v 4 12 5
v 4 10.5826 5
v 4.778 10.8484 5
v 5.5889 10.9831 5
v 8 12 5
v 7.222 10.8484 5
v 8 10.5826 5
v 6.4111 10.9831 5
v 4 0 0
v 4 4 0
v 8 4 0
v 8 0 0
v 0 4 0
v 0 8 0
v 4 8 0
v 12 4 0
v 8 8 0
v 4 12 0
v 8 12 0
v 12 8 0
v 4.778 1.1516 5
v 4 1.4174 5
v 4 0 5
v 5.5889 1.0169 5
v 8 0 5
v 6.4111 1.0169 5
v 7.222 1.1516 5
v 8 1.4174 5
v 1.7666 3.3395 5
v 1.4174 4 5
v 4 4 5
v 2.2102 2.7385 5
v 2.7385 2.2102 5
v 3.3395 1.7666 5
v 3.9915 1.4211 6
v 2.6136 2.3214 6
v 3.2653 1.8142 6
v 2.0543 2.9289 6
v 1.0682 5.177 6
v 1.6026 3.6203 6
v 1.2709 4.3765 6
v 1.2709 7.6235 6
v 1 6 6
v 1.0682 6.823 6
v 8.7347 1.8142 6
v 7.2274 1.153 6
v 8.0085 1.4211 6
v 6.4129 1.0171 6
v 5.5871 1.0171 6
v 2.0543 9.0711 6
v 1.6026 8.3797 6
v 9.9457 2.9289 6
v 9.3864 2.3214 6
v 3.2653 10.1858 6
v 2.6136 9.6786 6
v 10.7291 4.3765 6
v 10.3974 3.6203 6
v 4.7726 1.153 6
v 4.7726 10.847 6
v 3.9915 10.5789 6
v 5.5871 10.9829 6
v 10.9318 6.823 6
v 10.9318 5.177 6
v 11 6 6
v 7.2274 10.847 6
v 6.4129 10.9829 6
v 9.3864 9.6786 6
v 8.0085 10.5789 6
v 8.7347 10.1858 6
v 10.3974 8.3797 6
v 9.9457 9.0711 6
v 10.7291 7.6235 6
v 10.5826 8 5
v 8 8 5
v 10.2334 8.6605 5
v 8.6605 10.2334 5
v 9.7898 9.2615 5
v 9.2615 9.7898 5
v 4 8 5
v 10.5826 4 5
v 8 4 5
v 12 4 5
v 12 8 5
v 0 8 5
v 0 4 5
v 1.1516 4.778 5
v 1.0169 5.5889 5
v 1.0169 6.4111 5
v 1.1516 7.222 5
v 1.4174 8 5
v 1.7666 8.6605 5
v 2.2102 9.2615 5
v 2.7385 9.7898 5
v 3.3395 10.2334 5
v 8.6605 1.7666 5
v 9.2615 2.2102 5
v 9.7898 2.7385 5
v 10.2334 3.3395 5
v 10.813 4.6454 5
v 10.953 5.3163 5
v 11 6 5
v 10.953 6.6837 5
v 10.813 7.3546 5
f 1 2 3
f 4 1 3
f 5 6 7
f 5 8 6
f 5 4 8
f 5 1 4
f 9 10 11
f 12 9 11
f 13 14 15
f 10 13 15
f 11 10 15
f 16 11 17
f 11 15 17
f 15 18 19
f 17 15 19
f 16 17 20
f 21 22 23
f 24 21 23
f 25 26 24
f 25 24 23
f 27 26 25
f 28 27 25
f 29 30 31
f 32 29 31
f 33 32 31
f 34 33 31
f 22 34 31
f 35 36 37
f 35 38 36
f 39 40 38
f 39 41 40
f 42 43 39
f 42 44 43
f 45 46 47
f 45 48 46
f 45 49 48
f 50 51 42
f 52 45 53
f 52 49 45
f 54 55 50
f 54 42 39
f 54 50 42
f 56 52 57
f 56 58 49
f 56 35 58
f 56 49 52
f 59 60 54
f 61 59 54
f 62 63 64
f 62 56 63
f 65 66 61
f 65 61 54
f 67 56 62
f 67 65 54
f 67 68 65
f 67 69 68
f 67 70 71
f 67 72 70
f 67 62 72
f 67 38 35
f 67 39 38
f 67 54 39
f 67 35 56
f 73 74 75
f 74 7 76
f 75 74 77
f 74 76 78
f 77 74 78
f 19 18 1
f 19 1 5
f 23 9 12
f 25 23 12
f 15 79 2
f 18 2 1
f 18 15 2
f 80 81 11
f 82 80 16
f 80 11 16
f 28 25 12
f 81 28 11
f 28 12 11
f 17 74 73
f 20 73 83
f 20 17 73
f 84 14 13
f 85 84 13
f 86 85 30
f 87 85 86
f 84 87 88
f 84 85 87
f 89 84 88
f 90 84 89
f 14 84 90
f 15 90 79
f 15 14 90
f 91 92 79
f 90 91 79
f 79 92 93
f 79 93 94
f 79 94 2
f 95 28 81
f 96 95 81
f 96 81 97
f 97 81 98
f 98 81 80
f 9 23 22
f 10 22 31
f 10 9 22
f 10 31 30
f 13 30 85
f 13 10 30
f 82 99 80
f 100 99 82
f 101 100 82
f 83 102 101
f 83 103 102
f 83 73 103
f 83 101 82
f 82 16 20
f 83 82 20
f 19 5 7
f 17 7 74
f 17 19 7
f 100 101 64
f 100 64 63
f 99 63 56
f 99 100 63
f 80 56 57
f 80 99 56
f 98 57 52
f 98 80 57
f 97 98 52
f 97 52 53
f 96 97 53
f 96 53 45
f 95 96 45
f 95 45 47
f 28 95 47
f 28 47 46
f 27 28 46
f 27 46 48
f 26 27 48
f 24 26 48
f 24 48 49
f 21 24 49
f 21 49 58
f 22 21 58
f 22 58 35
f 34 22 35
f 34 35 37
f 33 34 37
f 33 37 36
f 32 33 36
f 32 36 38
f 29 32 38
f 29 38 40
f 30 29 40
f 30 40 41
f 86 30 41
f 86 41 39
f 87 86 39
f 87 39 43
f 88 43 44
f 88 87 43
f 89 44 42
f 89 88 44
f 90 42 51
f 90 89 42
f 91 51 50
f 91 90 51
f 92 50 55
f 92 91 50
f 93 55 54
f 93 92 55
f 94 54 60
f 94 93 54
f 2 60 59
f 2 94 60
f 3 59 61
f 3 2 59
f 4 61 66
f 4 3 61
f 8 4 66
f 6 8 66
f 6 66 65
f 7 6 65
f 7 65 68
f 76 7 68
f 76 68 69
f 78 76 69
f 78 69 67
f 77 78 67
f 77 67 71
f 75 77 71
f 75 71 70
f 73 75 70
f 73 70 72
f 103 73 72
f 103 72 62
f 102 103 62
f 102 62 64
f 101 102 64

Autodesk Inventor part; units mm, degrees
ref_plane "YZ Plane" through (0, 0, 0) normal (1, 0, 0) x (0, 1, 0)
ref_plane "XZ Plane" through (0, 0, 0) normal (0, 1, 0) x (-1, 0, 0)
ref_plane "XY Plane" through (0, 0, 0) normal (0, 0, 1) x (1, 0, 0)
sketch "Sketch1" plane through (0, 0, 0) normal (0, 0, 1) x (1, 0, 0)
  line L0 (6, 12) -> (4, 12)
  line L1 (6, 12) -> (8, 12)
  line L2 (12, 6) -> (12, 8)
  line L3 (12, 6) -> (12, 4)
  line L4 (0, 6) -> (0, 8)
  line L5 (0, 6) -> (0, 4)
  line L6 (6, 0) -> (8, 0)
  line L7 (6, 0) -> (4, 0)
  line L8 (4, 0) -> (4, 4)
  line L9 (4, 4) -> (0, 4)
  line L10 (0, 8) -> (4, 8)
  line L11 (4, 8) -> (4, 12)
  line L12 (8, 12) -> (8, 8)
  line L13 (8, 8) -> (12, 8)
  line L14 (8, 0) -> (8, 4)
  line L15 (8, 4) -> (12, 4)
  point P0 (0, 0)
  dimension "d2" = 2
  dimension "d3" = 2
  dimension "d4" = 2
  dimension "d5" = 2
  dimension "d6" = 2
  dimension "d7" = 2
  dimension "d8" = 2
  dimension "d9" = 2
extrude "Extrusion1" add sketch "Sketch1" along normal blind 5
sketch "Sketch2" plane through (0, 0, 5) normal (0, 0, 1) x (1, 0, 0)
  line L0 (0, 8) -> (0, 4) projected
  line L1 (0, 6) -> (12, 6)
  line L2 (12, 4) -> (12, 8) projected
  line L3 (8, 12) -> (4, 12) projected
  line L4 (6, 12) -> (6, 0)
  circle A0 centre (6, 6) radius 5
  point P0 (0, 0)
  dimension "d12" = 10
extrude "Extrusion2" add sketch "Sketch2" along normal blind 1
properties part number "PlusBtn"
